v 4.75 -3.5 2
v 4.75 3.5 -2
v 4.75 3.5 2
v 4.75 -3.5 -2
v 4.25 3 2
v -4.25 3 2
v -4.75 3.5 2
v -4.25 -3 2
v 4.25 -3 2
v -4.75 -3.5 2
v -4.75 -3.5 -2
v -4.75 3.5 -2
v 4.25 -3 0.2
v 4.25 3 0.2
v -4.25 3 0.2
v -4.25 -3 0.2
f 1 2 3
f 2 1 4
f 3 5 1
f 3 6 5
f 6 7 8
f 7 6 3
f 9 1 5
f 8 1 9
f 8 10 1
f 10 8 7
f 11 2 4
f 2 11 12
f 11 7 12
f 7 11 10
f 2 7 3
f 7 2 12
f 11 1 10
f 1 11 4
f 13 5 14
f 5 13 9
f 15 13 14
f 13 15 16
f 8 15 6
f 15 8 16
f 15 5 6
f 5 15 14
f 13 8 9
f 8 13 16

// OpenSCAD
// make cube (fill sides) with top open and bottom closed

cw=9.5; // cube width
cd=7; // cube depth
ch=4; // cube height

main();

module main() {
    union() {
            difference() {
                // Outer frame
                cube([cw, cd, ch], center=true);
                // Inner space
                translate([0, 0, +ch/2 + 0.1]) // Slightly lower to avoid z-fighting
                    cube([cw - 1, cd - 1, ch - 0.2], center=true);
            }
    }
}
